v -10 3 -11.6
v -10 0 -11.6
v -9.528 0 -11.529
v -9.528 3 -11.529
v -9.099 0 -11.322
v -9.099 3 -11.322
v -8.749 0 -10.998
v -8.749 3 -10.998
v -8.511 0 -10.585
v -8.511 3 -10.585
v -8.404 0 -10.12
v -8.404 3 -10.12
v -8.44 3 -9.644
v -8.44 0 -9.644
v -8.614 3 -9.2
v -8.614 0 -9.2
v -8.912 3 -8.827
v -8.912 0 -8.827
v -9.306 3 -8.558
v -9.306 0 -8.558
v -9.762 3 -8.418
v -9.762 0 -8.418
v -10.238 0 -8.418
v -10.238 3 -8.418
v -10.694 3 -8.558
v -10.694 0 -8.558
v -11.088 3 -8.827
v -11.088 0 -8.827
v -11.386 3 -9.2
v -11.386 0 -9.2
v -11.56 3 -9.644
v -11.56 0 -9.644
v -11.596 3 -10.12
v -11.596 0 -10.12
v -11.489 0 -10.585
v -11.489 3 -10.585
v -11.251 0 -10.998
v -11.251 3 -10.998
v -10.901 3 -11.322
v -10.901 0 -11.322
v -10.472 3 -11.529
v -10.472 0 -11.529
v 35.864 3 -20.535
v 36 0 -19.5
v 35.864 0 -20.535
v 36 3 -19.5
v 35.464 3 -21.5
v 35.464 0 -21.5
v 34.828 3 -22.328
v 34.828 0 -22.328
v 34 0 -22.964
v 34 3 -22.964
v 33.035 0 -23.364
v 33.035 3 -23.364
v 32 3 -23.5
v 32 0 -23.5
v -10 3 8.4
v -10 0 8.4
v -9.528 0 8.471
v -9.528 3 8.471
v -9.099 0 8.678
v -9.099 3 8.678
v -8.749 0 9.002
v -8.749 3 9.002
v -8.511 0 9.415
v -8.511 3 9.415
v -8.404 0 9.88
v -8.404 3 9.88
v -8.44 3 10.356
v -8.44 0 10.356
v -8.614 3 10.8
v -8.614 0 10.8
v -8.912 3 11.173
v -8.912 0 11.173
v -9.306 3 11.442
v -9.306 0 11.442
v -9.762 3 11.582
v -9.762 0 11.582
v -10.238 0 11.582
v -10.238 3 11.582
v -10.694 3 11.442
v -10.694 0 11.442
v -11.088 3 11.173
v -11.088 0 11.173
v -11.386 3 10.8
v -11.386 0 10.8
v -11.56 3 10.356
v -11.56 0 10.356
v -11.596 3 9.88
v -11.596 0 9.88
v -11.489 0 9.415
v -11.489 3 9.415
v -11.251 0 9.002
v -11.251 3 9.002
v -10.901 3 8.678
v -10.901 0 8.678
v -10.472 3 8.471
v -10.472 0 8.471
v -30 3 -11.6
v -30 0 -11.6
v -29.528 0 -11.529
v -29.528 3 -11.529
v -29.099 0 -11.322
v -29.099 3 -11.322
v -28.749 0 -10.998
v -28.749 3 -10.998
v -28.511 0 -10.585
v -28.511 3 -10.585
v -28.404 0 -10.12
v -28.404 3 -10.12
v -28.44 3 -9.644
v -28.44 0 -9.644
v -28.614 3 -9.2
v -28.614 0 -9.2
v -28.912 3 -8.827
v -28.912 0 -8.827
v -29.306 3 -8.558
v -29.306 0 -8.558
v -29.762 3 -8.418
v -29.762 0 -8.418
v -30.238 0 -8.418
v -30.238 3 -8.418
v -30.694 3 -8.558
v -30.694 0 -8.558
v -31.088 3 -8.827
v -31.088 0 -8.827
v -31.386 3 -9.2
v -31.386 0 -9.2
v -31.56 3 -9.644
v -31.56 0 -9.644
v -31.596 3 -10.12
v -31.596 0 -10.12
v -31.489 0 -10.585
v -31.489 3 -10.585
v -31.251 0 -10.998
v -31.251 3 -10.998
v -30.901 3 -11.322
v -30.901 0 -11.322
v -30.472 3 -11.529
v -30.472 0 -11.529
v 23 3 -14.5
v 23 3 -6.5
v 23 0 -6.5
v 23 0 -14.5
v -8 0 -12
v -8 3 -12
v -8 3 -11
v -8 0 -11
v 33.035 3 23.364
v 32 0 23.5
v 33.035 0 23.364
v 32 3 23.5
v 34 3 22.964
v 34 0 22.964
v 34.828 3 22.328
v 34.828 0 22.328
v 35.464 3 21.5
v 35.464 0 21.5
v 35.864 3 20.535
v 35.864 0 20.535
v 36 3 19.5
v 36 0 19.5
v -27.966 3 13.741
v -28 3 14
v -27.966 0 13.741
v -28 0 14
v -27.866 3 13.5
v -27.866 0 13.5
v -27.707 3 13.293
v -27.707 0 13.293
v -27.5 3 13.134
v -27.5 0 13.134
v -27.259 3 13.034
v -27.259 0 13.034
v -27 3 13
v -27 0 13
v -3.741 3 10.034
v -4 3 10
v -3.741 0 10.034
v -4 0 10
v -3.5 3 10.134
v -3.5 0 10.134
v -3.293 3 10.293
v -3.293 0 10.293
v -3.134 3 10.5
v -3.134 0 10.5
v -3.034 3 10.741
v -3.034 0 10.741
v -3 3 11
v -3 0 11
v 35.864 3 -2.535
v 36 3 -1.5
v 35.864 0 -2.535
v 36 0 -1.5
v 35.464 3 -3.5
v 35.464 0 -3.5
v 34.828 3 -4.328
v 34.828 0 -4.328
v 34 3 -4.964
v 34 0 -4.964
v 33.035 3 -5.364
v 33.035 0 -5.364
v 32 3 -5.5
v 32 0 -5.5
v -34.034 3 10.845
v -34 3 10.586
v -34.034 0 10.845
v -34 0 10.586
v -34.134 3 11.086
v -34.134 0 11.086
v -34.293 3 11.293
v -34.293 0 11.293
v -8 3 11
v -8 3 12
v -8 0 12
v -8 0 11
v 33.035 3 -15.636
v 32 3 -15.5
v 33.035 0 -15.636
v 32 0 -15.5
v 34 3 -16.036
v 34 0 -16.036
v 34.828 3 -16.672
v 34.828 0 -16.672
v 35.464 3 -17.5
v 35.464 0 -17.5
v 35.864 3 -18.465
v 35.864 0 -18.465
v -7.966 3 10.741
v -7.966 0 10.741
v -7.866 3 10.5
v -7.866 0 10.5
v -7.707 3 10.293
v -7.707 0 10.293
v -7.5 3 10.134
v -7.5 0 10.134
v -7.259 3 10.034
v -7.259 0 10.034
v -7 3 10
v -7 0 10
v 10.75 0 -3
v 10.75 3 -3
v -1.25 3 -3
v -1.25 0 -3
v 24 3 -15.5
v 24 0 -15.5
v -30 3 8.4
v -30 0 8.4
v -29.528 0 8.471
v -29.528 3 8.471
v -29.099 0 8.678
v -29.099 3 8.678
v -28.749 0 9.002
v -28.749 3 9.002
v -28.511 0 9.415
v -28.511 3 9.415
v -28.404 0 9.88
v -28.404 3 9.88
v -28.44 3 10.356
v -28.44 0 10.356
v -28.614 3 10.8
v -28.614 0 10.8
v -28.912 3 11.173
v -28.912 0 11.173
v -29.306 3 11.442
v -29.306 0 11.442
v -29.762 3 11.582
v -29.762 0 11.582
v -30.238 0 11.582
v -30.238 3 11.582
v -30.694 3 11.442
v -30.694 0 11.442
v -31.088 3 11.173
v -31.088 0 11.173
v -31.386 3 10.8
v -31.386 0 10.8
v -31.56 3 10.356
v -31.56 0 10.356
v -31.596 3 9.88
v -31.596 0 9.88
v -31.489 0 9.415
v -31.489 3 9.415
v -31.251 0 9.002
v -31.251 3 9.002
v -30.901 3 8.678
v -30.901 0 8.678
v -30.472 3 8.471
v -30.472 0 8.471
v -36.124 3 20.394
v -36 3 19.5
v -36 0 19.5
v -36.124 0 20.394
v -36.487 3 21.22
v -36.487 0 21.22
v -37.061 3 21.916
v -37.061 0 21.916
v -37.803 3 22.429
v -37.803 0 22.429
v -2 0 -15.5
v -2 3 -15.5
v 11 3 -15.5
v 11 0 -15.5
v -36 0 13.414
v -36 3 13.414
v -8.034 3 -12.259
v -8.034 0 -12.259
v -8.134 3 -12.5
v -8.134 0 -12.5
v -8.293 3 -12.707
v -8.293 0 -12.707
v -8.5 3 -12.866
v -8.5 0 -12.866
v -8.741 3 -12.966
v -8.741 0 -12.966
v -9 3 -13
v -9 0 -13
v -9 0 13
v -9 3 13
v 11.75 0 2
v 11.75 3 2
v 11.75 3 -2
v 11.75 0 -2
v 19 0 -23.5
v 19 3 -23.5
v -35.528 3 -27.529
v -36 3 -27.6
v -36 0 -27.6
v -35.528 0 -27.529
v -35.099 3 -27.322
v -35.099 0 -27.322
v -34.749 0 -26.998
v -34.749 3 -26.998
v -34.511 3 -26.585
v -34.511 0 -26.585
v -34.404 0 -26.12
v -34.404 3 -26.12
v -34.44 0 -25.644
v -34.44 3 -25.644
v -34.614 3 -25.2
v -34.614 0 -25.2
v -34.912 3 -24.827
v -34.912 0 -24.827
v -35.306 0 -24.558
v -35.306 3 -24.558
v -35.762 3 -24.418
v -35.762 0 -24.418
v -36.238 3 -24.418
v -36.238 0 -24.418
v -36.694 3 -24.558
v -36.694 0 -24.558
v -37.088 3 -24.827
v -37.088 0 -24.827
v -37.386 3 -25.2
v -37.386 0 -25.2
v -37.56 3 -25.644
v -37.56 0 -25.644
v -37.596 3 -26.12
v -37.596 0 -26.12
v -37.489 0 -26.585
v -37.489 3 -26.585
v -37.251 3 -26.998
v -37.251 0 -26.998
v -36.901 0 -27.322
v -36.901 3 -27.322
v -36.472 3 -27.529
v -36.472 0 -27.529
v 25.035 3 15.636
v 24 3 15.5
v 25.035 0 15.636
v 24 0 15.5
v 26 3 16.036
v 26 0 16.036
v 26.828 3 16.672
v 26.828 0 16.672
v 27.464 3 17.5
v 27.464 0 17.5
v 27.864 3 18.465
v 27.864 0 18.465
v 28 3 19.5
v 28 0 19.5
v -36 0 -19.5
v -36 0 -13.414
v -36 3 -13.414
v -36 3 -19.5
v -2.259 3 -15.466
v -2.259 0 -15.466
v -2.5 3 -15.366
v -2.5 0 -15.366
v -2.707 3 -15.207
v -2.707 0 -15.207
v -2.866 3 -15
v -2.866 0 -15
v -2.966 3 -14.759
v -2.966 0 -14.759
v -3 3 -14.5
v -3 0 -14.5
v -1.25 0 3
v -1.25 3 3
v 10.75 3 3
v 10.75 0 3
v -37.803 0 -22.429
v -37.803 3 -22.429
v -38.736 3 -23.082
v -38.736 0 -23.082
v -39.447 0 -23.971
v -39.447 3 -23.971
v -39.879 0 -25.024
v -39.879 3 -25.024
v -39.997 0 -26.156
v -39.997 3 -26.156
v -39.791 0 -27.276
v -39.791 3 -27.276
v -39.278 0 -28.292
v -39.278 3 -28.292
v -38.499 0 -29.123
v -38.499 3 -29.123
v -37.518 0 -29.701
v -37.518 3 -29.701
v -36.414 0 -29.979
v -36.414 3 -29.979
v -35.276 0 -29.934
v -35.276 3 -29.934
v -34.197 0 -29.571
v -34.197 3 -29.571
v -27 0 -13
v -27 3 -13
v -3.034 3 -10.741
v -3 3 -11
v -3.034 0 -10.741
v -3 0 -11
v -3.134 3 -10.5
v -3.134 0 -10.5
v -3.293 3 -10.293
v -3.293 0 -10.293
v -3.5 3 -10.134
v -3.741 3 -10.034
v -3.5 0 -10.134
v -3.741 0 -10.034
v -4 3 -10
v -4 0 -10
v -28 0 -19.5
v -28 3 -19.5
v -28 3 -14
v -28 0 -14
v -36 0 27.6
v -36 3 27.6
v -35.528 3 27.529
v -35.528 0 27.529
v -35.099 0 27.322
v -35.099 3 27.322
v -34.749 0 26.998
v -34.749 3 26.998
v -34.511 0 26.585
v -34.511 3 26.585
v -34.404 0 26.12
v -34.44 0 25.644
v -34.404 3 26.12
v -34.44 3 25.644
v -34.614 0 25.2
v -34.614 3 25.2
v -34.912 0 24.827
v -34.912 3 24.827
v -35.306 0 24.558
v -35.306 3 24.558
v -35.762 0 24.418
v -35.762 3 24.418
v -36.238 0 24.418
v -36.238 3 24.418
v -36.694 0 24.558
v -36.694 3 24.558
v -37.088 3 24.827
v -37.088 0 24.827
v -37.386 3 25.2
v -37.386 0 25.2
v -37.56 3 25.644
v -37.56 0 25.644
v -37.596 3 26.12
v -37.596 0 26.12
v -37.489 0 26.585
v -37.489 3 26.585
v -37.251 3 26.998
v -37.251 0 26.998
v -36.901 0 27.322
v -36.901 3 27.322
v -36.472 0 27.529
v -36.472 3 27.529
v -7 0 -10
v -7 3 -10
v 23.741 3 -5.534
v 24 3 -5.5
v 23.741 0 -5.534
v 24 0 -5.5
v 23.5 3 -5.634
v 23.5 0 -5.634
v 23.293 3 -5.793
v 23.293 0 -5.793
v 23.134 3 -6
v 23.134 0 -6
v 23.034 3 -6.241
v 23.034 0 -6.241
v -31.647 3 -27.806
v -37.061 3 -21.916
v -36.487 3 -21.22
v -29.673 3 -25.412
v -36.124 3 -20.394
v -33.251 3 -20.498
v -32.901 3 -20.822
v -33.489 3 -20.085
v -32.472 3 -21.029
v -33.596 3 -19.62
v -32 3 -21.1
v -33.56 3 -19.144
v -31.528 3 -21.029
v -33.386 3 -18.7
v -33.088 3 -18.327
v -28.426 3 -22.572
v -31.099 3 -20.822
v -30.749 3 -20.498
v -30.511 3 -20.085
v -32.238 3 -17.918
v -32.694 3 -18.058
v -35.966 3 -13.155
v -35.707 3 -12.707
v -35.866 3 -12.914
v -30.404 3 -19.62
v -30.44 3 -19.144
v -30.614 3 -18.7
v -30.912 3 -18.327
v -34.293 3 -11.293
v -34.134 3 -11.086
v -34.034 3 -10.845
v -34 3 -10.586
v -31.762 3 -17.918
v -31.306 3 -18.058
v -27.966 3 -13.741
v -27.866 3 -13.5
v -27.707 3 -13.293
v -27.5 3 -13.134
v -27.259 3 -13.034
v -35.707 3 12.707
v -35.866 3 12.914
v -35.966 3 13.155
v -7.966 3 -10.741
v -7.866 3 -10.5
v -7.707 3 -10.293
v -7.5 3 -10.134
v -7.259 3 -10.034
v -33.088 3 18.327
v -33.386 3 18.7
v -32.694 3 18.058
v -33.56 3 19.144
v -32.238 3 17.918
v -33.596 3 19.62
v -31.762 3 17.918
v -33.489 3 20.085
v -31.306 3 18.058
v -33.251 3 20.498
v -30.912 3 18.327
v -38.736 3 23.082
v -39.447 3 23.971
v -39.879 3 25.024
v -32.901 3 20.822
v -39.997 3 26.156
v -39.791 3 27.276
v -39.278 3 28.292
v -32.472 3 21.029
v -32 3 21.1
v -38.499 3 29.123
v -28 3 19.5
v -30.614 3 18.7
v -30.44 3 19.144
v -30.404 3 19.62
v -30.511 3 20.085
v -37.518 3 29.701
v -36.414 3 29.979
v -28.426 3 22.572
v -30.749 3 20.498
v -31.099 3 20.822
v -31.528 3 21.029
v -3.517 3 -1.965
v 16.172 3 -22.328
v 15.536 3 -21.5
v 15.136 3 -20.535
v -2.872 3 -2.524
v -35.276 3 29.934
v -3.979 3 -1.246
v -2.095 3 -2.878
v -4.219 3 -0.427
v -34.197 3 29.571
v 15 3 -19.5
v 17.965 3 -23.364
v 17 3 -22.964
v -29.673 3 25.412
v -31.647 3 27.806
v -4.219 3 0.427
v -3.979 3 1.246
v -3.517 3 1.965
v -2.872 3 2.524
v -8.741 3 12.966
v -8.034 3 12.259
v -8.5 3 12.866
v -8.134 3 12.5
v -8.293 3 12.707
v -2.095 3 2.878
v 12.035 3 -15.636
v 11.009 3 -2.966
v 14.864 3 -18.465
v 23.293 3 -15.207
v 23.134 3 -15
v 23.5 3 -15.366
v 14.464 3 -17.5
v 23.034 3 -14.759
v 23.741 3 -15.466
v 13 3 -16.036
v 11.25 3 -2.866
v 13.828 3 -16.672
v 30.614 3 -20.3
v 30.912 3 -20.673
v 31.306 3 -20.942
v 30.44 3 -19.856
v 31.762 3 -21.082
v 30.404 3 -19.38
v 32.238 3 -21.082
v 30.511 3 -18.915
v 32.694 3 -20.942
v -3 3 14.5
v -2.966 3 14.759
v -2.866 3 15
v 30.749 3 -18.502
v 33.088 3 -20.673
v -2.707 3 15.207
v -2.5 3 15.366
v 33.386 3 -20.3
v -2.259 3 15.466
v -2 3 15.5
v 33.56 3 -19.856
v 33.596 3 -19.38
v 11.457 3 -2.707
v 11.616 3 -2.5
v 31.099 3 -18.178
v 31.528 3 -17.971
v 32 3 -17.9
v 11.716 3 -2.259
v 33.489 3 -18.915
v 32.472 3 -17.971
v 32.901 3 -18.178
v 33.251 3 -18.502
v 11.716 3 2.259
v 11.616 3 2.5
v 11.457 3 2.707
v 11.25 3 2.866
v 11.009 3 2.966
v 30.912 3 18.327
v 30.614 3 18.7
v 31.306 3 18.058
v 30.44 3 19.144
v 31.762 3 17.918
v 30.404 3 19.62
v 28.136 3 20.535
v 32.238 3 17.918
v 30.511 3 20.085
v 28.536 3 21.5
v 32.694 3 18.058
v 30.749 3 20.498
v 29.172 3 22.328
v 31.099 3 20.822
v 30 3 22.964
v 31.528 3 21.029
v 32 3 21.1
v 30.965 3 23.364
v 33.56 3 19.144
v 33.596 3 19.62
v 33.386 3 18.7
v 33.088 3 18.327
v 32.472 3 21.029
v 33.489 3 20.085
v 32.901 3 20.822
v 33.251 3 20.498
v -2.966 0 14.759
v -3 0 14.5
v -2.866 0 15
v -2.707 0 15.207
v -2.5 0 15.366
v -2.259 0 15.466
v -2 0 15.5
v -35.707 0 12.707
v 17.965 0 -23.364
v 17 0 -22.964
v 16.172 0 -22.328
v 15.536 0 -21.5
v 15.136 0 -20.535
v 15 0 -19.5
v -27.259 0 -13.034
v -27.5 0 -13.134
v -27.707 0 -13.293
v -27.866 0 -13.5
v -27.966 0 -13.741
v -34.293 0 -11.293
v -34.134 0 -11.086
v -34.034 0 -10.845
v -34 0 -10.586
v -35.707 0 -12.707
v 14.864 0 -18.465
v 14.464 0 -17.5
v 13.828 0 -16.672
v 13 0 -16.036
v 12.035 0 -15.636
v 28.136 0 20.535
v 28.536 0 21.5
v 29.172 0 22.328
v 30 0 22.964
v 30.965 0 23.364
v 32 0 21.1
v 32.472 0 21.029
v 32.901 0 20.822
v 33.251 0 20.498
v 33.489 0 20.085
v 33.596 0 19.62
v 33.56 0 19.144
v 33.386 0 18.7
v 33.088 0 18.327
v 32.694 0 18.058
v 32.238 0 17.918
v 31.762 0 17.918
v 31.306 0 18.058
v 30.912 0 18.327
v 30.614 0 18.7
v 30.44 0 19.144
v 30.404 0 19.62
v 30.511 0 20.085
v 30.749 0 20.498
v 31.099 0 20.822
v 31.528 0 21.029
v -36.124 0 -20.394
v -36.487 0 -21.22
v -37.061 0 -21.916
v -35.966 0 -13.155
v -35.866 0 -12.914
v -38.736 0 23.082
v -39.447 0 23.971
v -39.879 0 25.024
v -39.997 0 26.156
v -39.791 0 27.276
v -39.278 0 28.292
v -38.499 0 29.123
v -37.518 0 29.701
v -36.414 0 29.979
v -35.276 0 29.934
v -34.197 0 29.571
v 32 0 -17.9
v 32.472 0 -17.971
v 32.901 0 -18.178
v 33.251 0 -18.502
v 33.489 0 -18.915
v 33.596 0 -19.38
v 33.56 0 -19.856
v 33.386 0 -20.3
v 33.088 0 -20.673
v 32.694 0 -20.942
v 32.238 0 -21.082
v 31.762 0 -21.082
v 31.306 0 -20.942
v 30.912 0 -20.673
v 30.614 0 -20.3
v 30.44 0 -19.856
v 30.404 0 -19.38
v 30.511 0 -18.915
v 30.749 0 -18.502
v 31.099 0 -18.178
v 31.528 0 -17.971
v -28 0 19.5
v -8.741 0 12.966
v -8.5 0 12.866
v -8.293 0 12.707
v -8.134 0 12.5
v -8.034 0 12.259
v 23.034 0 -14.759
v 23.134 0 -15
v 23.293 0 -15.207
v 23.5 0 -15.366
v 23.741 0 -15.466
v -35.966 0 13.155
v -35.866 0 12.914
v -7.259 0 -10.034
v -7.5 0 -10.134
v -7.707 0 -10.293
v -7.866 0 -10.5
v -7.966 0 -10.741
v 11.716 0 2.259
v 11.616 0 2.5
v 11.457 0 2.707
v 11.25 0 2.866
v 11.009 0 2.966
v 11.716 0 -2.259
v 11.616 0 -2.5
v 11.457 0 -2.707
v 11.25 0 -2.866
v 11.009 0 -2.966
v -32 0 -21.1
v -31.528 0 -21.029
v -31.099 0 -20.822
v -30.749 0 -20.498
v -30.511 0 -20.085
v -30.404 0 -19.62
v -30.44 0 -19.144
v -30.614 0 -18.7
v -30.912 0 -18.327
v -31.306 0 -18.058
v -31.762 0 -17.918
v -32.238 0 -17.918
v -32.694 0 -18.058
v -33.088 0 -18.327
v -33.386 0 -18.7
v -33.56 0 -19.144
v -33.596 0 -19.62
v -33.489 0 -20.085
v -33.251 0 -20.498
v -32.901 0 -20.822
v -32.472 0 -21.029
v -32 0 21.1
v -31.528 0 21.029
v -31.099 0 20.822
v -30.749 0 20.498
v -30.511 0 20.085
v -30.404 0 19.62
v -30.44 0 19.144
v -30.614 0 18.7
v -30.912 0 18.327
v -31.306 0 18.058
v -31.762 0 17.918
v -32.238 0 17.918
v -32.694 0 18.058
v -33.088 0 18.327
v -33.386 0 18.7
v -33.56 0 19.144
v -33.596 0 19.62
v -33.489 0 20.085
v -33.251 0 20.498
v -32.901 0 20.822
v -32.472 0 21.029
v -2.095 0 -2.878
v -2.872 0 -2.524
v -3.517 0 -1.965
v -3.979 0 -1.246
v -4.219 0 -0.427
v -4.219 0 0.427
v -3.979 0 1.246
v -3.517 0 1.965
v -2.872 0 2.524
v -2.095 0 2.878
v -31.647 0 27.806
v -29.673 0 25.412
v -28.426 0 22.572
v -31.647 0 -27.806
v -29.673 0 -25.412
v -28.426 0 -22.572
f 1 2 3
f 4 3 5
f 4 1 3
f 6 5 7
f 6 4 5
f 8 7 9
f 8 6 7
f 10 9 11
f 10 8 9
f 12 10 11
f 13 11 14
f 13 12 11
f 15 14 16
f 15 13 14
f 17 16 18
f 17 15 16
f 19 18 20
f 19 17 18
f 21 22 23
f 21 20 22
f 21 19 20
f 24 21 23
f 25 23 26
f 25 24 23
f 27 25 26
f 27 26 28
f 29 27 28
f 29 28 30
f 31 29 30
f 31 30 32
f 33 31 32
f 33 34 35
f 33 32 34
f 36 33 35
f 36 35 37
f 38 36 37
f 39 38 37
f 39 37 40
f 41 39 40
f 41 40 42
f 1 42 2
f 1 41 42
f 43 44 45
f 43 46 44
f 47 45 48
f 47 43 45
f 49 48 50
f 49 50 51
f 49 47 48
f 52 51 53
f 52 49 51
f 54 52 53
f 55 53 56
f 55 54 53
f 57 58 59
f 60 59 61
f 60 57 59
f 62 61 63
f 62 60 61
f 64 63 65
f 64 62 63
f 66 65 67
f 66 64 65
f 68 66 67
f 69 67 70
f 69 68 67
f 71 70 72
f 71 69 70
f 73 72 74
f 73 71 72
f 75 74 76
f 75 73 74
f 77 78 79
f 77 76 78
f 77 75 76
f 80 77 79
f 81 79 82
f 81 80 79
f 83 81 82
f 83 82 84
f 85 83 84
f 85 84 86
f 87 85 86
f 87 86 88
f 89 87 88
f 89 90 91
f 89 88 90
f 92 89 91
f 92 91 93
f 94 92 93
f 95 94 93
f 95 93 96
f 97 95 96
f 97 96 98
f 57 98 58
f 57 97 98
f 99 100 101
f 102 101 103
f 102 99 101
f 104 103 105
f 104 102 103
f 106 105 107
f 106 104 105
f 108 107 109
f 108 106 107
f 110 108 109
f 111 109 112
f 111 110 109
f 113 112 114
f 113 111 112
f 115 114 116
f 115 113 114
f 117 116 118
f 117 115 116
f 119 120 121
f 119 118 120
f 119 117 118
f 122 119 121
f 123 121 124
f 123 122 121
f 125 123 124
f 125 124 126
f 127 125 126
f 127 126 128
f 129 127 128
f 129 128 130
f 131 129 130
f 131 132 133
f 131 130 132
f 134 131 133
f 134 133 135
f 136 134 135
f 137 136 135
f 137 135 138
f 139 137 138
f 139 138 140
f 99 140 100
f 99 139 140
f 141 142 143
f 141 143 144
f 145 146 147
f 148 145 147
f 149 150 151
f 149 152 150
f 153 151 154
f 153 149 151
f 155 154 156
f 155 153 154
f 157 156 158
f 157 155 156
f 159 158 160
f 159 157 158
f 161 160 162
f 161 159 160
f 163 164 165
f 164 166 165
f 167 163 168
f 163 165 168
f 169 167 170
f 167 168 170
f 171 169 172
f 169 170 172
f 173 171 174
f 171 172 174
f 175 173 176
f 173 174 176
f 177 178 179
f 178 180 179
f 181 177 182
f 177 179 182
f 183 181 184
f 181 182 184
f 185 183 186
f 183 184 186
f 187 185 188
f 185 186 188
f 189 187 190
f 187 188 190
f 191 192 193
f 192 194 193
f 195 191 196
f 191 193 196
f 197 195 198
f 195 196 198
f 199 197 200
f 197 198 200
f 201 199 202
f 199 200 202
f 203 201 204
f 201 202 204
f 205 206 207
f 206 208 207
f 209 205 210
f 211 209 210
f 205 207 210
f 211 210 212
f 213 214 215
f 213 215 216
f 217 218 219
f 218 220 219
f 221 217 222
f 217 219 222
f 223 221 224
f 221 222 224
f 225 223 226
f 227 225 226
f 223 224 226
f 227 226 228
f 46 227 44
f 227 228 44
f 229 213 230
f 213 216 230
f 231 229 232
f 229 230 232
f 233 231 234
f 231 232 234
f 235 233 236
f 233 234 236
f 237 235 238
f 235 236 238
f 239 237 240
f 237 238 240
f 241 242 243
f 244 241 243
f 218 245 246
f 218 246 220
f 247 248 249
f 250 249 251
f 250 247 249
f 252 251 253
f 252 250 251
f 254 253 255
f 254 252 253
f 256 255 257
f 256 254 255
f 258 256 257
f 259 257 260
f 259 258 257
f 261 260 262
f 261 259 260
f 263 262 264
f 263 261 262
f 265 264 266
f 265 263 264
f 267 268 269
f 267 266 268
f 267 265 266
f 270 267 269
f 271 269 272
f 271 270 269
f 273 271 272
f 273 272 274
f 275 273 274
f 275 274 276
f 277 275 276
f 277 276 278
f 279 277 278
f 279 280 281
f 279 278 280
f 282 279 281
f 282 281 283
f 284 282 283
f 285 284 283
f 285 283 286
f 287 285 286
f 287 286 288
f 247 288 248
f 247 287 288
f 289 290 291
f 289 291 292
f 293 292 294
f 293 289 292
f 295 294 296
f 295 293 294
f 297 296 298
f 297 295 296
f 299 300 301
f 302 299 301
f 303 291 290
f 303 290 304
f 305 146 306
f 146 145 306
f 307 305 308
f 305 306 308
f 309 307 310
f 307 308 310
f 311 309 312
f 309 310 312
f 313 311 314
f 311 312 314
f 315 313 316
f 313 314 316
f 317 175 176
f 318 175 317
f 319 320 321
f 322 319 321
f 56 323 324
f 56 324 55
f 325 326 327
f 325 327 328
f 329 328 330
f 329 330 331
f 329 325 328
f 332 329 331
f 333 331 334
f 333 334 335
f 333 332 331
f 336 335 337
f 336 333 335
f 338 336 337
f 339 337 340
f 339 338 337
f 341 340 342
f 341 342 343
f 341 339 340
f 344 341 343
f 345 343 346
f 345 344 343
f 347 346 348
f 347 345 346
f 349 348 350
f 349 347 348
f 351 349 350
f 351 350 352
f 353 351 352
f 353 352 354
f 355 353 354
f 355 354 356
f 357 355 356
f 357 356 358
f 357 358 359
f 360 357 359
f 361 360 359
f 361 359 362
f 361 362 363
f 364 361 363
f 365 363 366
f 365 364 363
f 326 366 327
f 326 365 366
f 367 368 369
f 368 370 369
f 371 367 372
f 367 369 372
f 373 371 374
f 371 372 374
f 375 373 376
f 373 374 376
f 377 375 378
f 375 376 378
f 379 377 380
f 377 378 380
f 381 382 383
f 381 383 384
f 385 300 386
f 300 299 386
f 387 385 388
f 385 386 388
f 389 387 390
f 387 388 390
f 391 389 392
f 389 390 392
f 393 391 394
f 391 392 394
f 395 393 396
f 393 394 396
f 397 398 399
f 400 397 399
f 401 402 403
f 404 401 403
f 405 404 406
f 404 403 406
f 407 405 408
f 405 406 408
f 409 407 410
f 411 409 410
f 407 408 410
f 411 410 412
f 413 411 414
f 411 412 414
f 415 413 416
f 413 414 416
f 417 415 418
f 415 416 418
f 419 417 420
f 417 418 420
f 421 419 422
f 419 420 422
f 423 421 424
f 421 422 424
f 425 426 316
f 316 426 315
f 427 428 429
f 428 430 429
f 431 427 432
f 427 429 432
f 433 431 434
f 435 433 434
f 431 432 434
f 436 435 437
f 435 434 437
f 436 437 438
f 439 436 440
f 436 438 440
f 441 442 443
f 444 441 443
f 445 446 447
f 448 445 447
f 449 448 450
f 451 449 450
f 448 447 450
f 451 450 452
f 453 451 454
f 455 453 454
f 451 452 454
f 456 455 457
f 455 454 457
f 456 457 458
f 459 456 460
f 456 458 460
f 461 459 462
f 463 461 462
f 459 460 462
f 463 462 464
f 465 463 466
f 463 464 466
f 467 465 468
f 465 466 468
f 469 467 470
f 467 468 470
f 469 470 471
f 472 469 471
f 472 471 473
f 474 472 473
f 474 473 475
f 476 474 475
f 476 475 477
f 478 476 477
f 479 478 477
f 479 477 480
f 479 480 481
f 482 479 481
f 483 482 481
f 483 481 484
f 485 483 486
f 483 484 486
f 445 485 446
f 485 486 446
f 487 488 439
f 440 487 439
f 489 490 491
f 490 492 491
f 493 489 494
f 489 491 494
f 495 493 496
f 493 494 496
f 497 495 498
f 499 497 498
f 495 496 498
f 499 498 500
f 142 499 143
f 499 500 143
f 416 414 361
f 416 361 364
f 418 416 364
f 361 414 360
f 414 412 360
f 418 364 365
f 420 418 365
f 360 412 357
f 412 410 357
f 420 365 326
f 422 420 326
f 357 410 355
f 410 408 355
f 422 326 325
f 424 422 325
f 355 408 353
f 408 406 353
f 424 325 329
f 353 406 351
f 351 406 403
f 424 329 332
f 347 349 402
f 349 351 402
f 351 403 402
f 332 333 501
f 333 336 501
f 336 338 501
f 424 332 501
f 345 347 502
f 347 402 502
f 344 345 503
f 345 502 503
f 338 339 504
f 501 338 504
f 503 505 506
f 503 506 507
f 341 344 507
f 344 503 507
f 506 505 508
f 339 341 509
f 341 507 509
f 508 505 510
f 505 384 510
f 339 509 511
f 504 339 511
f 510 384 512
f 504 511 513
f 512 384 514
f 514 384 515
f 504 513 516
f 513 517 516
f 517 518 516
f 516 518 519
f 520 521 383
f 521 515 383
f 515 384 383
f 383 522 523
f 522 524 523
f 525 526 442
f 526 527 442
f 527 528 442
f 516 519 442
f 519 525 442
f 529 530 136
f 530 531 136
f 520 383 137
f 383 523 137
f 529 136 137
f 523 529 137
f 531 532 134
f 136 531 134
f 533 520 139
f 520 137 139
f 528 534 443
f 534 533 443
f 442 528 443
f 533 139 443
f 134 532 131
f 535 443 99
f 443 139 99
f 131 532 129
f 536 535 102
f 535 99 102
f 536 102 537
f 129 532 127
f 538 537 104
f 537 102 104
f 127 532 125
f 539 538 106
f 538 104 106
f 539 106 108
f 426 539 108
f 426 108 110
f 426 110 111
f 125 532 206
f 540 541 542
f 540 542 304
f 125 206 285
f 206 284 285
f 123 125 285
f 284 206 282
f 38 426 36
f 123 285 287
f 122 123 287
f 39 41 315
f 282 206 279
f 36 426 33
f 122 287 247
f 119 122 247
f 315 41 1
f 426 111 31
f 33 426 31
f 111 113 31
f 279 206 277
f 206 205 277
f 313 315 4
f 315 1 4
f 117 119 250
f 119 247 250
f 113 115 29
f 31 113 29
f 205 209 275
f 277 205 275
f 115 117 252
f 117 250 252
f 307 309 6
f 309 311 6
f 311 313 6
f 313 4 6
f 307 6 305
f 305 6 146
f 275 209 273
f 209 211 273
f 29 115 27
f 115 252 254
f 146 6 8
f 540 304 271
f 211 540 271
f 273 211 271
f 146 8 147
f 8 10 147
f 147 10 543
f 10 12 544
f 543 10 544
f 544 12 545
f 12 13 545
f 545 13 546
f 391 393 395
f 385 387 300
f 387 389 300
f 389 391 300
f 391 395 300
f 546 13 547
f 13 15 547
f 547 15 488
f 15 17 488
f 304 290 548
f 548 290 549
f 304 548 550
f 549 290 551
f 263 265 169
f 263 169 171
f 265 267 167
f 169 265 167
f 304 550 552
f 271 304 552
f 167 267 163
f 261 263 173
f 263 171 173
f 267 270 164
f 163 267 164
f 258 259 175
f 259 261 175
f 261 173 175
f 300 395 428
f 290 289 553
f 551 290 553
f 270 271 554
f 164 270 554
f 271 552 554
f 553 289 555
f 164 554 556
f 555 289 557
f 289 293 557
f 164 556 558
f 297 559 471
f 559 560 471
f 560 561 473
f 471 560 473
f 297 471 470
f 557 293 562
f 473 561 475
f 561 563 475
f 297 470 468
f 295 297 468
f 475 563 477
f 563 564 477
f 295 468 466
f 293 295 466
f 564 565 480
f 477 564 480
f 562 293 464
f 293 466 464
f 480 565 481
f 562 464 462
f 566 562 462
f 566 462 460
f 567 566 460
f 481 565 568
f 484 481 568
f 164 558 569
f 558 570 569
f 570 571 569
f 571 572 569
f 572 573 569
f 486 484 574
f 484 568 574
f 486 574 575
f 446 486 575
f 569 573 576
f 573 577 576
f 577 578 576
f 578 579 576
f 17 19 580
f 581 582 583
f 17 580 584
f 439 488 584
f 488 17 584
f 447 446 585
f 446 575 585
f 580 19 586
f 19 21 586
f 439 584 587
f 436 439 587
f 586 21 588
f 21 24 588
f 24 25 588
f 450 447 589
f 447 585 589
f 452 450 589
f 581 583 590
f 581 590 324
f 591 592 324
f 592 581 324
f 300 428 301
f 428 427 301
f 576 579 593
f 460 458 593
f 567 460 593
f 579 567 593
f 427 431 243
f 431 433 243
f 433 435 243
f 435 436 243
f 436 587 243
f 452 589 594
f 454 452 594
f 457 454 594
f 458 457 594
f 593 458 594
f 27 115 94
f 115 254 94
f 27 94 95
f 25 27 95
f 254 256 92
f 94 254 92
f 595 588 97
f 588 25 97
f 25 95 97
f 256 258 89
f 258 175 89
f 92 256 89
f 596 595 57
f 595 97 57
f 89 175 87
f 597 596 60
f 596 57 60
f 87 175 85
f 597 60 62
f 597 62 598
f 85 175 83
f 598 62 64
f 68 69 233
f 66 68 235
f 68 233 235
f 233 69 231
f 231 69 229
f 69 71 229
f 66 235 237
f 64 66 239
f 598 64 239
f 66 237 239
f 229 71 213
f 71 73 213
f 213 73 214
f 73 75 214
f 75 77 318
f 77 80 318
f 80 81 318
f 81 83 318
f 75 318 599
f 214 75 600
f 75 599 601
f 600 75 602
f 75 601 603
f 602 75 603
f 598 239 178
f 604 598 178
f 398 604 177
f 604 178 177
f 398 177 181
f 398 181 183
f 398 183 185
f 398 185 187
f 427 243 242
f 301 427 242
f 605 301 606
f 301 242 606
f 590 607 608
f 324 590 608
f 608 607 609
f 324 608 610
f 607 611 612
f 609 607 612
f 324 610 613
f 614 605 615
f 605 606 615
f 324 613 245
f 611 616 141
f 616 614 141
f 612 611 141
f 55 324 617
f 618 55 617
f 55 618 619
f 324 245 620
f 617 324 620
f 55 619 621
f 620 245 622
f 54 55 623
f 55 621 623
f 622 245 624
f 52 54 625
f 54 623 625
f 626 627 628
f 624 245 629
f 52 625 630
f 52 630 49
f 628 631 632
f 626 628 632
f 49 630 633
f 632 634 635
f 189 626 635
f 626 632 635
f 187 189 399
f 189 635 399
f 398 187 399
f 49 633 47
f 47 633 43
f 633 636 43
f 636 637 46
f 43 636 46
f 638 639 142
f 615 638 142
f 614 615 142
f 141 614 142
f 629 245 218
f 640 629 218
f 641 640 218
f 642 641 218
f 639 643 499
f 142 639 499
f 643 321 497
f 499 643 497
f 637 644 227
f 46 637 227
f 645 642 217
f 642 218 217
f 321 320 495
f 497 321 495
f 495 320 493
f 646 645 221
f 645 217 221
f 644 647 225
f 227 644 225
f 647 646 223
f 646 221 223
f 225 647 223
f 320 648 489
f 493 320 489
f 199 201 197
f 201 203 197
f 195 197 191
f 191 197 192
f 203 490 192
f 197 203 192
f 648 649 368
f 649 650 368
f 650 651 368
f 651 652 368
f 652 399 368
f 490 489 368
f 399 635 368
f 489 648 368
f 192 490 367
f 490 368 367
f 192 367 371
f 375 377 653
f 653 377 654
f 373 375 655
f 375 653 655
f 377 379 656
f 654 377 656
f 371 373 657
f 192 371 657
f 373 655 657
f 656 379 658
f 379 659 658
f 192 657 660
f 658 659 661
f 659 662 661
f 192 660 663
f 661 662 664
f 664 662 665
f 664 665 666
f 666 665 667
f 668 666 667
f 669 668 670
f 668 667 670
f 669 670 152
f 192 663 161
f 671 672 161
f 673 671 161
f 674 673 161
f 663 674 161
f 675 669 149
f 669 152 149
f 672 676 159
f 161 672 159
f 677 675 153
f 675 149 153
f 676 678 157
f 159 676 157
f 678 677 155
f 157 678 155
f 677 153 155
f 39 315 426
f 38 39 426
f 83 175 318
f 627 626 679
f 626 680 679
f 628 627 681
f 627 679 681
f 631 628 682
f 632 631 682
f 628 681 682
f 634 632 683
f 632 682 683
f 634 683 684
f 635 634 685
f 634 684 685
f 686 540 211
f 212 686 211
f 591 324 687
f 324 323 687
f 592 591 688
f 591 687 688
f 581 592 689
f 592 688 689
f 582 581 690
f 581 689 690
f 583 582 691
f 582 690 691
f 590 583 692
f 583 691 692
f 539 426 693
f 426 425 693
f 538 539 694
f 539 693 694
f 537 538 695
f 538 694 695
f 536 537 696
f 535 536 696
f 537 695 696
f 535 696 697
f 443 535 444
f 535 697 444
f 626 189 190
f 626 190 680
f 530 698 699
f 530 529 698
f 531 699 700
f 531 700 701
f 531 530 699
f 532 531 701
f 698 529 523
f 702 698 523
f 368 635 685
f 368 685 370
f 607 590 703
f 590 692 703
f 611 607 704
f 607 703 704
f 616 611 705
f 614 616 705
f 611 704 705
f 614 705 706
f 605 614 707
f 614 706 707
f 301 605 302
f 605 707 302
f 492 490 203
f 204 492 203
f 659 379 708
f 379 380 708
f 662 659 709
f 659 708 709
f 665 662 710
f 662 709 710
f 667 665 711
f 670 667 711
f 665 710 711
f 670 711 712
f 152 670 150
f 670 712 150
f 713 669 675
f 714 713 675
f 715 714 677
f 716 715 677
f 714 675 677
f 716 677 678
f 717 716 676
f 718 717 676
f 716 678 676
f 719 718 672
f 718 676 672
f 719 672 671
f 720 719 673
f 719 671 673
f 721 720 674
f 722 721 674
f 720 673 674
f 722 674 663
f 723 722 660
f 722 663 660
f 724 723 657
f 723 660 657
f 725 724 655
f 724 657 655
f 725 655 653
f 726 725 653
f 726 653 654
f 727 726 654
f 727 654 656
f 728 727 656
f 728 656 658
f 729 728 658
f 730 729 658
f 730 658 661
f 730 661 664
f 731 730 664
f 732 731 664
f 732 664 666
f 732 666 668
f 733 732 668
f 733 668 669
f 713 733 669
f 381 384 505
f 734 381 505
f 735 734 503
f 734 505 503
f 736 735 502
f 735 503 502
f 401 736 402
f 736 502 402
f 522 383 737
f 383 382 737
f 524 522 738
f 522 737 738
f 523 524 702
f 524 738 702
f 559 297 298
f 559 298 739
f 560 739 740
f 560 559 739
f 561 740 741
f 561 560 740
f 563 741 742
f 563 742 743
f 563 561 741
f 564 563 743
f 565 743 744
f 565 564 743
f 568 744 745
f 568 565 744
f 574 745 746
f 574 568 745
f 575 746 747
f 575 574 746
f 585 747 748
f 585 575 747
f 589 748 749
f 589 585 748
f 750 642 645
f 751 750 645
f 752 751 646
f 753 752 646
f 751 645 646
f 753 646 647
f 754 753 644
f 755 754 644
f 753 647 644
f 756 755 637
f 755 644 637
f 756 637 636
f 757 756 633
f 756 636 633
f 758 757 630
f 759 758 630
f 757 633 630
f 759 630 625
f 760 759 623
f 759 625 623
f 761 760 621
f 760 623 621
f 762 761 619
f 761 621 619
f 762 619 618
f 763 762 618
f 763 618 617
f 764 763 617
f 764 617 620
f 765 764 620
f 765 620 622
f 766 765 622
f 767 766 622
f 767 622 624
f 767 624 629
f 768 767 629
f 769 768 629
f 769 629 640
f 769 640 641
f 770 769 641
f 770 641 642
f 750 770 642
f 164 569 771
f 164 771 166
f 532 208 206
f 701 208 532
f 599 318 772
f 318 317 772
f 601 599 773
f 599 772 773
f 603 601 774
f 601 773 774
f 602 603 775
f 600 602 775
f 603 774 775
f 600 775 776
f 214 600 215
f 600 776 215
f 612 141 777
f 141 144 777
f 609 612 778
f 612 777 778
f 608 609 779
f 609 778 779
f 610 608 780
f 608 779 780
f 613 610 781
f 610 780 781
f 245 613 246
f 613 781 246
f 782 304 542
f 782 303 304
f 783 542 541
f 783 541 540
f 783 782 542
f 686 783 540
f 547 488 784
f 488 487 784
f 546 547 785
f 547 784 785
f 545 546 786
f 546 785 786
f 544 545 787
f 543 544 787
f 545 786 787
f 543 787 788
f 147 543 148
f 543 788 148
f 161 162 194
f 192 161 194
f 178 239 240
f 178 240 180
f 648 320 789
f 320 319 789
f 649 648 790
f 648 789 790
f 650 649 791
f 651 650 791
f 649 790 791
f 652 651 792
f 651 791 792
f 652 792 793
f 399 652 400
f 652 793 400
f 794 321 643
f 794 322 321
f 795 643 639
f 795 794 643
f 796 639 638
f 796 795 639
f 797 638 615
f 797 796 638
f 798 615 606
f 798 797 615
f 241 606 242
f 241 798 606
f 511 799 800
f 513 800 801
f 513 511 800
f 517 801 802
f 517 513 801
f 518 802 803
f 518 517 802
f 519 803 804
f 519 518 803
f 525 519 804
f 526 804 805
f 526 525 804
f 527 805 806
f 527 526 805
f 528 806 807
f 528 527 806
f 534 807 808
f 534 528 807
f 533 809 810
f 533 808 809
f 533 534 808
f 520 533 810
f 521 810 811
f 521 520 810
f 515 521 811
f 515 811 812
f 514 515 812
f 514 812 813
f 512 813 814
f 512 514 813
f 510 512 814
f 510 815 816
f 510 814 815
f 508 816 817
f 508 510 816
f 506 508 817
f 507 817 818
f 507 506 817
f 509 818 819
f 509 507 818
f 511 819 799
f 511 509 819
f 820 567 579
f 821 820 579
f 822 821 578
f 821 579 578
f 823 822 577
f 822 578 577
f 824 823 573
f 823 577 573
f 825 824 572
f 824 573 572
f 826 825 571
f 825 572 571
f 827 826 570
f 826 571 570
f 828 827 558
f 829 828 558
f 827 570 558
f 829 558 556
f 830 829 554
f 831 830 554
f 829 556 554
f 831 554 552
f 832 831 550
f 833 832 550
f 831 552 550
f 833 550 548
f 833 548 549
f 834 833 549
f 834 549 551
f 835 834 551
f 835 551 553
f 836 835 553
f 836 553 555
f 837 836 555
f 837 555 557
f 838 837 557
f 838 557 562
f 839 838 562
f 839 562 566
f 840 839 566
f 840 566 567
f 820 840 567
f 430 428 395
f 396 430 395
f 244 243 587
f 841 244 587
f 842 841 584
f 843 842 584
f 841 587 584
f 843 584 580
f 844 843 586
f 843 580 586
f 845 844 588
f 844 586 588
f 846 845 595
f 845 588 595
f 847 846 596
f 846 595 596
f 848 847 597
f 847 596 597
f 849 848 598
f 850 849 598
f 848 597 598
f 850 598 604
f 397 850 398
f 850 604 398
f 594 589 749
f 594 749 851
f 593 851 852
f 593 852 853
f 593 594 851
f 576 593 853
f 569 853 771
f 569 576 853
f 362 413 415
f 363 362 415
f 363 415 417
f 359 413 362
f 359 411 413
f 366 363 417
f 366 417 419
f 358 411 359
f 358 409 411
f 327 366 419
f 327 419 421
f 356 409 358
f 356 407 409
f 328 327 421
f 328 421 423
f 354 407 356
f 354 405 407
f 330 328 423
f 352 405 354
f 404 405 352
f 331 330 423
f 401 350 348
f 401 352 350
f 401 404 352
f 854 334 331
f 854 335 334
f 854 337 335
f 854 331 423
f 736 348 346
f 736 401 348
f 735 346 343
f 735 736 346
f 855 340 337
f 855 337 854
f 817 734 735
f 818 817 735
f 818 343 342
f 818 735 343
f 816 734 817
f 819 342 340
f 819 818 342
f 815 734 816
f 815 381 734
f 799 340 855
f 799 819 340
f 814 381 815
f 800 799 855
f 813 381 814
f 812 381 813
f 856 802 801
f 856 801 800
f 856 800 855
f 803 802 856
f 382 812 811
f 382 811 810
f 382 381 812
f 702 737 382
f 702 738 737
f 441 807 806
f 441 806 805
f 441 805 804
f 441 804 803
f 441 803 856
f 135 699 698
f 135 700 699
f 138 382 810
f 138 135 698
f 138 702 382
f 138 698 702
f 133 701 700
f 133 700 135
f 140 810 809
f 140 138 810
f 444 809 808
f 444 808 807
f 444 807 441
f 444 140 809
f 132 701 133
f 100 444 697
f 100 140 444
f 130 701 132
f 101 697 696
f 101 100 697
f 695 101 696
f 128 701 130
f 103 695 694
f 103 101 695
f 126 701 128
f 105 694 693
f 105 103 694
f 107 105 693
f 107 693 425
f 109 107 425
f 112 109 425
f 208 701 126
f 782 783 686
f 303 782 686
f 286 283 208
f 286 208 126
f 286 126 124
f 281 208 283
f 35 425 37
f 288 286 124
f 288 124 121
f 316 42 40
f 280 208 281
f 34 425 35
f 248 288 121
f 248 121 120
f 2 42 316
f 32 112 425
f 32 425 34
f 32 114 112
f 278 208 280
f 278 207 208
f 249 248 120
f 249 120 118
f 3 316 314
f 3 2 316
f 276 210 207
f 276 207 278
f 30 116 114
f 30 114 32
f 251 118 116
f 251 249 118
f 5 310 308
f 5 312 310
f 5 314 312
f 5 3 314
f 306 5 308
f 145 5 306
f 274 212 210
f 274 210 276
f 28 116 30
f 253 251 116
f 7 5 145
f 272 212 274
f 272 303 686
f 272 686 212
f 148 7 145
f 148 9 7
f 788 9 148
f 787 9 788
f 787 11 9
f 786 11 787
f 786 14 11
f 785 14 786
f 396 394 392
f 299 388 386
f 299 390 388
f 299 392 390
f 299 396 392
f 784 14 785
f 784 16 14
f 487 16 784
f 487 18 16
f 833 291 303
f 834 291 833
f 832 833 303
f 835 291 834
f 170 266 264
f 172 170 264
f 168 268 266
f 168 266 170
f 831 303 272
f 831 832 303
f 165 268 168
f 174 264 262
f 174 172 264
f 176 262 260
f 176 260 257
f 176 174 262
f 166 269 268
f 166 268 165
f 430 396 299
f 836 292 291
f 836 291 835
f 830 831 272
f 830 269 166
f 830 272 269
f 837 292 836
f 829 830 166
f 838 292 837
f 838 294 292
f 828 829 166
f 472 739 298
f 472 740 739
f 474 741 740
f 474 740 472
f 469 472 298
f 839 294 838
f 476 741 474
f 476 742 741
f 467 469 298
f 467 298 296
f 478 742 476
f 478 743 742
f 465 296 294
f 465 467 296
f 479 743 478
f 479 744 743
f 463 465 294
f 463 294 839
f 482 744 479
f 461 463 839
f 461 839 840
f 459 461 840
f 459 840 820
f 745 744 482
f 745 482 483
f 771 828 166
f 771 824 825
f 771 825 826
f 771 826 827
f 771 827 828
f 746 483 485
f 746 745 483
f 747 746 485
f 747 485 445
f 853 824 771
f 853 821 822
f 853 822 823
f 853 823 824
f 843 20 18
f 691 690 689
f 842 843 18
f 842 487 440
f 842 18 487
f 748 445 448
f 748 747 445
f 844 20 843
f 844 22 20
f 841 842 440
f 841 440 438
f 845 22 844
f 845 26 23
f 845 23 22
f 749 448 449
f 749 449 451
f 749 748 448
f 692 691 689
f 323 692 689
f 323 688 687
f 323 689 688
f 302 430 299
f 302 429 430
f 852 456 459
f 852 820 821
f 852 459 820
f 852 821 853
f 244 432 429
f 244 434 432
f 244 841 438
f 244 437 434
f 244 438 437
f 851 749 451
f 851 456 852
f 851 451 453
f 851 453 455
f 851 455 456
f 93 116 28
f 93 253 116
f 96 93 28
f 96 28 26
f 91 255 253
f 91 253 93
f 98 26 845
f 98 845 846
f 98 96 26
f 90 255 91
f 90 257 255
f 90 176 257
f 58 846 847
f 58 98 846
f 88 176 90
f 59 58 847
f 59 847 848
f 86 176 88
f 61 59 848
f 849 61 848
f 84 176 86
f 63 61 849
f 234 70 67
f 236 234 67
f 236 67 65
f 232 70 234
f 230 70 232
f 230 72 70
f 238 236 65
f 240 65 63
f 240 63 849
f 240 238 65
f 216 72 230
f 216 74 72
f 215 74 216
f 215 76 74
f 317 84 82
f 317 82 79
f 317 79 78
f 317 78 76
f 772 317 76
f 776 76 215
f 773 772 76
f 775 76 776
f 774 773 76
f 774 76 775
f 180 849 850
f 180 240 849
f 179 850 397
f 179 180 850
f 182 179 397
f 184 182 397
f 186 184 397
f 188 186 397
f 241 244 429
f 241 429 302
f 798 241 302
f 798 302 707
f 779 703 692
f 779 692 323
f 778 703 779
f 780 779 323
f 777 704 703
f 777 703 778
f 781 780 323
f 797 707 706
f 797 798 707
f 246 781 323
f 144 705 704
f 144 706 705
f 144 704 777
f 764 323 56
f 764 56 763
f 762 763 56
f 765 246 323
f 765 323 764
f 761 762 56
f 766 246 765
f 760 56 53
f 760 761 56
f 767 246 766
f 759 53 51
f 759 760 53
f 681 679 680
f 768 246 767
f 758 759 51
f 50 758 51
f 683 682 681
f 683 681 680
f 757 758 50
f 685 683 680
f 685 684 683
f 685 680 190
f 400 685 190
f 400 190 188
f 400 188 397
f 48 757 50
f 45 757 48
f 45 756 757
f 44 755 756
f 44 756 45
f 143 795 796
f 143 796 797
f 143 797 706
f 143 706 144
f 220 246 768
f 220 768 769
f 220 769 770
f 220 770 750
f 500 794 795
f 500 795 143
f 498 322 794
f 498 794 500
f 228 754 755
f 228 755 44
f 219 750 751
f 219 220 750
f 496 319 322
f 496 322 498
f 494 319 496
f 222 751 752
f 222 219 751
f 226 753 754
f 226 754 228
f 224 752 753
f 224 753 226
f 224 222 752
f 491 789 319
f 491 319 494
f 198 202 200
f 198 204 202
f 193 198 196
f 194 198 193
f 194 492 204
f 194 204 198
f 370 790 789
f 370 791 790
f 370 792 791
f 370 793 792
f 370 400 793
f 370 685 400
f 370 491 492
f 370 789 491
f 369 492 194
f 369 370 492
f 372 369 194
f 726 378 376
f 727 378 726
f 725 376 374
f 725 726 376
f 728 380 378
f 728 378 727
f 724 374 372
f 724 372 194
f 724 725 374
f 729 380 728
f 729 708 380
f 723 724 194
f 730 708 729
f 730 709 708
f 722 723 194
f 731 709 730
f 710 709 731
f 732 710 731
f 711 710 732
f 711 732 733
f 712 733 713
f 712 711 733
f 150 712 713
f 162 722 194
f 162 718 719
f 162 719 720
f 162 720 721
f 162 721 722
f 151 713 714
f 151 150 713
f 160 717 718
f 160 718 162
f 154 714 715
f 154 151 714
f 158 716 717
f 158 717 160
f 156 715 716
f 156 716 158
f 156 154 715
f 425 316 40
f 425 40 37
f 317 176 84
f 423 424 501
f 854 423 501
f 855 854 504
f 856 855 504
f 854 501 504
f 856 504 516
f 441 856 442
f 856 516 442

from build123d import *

# Parameters (mm, degrees)
CROQUIS1_W              = 72
CROQUIS1_H              = 47
SALIENTE_EXTRUIR1_DEPTH = 3
CROQUIS3_W              = 13
CROQUIS3_H              = 10
CROQUIS3_W_2            = 2
CROQUIS3_H_2            = 21
CORTAR_EXTRUIR2_DEPTH   = 44.095823464
CROQUIS2_R              = 1.6
CORTAR_EXTRUIR1_DEPTH   = 44.095823464
CORTAR_EXTRUIR3_DEPTH   = 34.75
CROQUIS5_R              = 1.6
CORTAR_EXTRUIR7_DEPTH   = 10
CHAFL_N1_SIZE           = 2.5
REDONDEO2_R             = 1
CROQUIS6_R              = 1.6
SALIENTE_EXTRUIR2_DEPTH = 3
REDONDEO1_R             = 4


# Some blends are built 0.0001 mm under size
with BuildPart() as part:
    # Croquis1 → Saliente-Extruir1 (new body)
    with BuildSketch(Plane(origin=(0, 0, 0), x_dir=(1, 0, 0), z_dir=(0, 1, 0))):
        Rectangle(CROQUIS1_W, CROQUIS1_H)
    extrude(amount=SALIENTE_EXTRUIR1_DEPTH)

    # Croquis3 → Cortar-Extruir2 (cut, through all)
    with BuildSketch(Plane(origin=(0, 3, 0), x_dir=(1, 0, 0), z_dir=(0, 1, 0))):
        Polygon((-8, 13), (-8, 10), (-3, 10), (-3, 15.5), (15, 15.5), (15, 23.5), (-36, 23.5), (-36, 19.5), (-28, 19.5), (-28, 13), align=None)
        Polygon((-28, -13), (-8, -13), (-8, -10), (-3, -10), (-3, -15.5), (28, -15.5), (28, -23.5), (-36, -23.5), (-36, -19.5), (-28, -19.5), align=None)
        with Locations((29.5, 10.5)):
            Rectangle(CROQUIS3_W, CROQUIS3_H)
        with Locations((-35, 0)):
            Rectangle(CROQUIS3_W_2, CROQUIS3_H_2)
    extrude(amount=-CORTAR_EXTRUIR2_DEPTH, mode=Mode.SUBTRACT)

    # Croquis2 → Cortar-Extruir1 (cut, through all)
    with BuildSketch(Plane(origin=(0, 3, 0), x_dir=(1, 0, 0), z_dir=(0, 1, 0))):
        with Locations((-32, 19.5)):
            Circle(CROQUIS2_R)
        with Locations(Location((32, 19.5, 0), (0, 0, 270))):
            Circle(CROQUIS2_R)
        with Locations(Location((32, -19.5, 0), (0, 0, 270))):
            Circle(CROQUIS2_R)
        with Locations((-32, -19.5)):
            Circle(CROQUIS2_R)
    extrude(amount=-CORTAR_EXTRUIR1_DEPTH, mode=Mode.SUBTRACT)

    # Croquis4 → Cortar-Extruir3 (cut)
    with BuildSketch(Plane(origin=(0, 3, 0), x_dir=(1, 0, 0), z_dir=(0, 1, 0))):
        with BuildLine():
            Line((-1.25, -3), (11.75, -3))
            Line((11.75, -3), (11.75, 3))
            Line((11.75, 3), (-1.25, 3))
            ThreePointArc((-1.25, 3), (-4.25, 0), (-1.25, -3))
        make_face()
    extrude(amount=-CORTAR_EXTRUIR3_DEPTH, mode=Mode.SUBTRACT)

    # Croquis5 → Cortar-Extruir7 (cut)
    with BuildSketch(Plane(origin=(0, 3, -3), x_dir=(1, 0, 0), z_dir=(0, -1, 0))):
        with Locations(Location((-30, 13, 0), (0, 0, 270))):
            Circle(CROQUIS5_R)
        with Locations(Location((-30, -7, 0), (0, 0, 270))):
            Circle(CROQUIS5_R)
        with Locations(Location((-10, 13, 0), (0, 0, 270))):
            Circle(CROQUIS5_R)
        with Locations(Location((-10, -7, 0), (0, 0, 270))):
            Circle(CROQUIS5_R)
    extrude(amount=CORTAR_EXTRUIR7_DEPTH, mode=Mode.SUBTRACT)

    # Chaflán1
    # the kernel refuses this chamfer: 2.5 mm, written as the material it takes off along each edge
    with BuildSketch(Plane(origin=(-36, 9.42920747, 10.5), x_dir=(-0.0274958766105877, 0, 0.9996219169112968), z_dir=(0, -1, 0))) as chafl_n1_piece_1_section:
        Polygon((CHAFL_N1_SIZE * 0.999621916911, -CHAFL_N1_SIZE * 0.0274958766106), (-CHAFL_N1_SIZE * 0.0274958766106, -CHAFL_N1_SIZE * 0.999621916911), (0, 0), align=None)
    chafl_n1_piece_1 = extrude(amount=15.85841494, mode=Mode.PRIVATE)
    chafl_n1_piece_1 = split(chafl_n1_piece_1, bisect_by=Plane(origin=(-34, 1.5, 11.364296031), z_dir=(-1, 0, 0)), keep=Keep.TOP, mode=Mode.PRIVATE)
    add(chafl_n1_piece_1, mode=Mode.SUBTRACT)
    with BuildSketch(Plane(origin=(-36, 9.42920747, -10.5), x_dir=(0.9996219169112968, 0, 0.027495876610586282), z_dir=(0, -1, 0))) as chafl_n1_piece_2_section:
        Polygon((CHAFL_N1_SIZE * 0.999621916911, -CHAFL_N1_SIZE * 0.0274958766106), (-CHAFL_N1_SIZE * 0.0274958766106, -CHAFL_N1_SIZE * 0.999621916911), (0, 0), align=None)
    chafl_n1_piece_2 = extrude(amount=15.85841494, mode=Mode.PRIVATE)
    chafl_n1_piece_2 = split(chafl_n1_piece_2, bisect_by=Plane(origin=(-34, 1.5, -11.364296031), z_dir=(-1, 0, 0)), keep=Keep.TOP, mode=Mode.PRIVATE)
    add(chafl_n1_piece_2, mode=Mode.SUBTRACT)

    # Redondeo2
    redondeo2_edges = [part.edges().sort_by_distance(p)[0] for p in [
        (11.75, 1.5, -3),
        (11.75, 1.5, 3),
        (-36, 1.5, 13),
        (-36, 1.5, -13),
        (-34, 1.5, 11),
        (-34, 1.5, -11),
        (-8, 1.5, -13),
        (-28, 1.5, -13),
        (-3, 1.5, -15.5),
        (-3, 1.5, -10),
        (-8, 1.5, -10),
        (-28, 1.5, 13),
        (-8, 1.5, 13),
        (-8, 1.5, 10),
        (-3, 1.5, 10),
        (-3, 1.5, 15.5),
        (23, 1.5, -5.5),
        (23, 1.5, -15.5),
    ]]
    fillet(redondeo2_edges, radius=REDONDEO2_R)

    # Croquis6 → Saliente-Extruir2 (add, through all)
    with BuildSketch(Plane(origin=(0, 3, 0), x_dir=(1, 0, 0), z_dir=(0, 1, 0))):
        with BuildLine():
            ThreePointArc((-34.197424136, -29.570815068), (-29.673479987, -25.412473854), (-28, -19.500000848))
            ThreePointArc((-28, -19.500000848), (-31.999999152, -15.5), (-36, -19.499999152))
            ThreePointArc((-36, -19.499999152), (-36.48674652, -21.219694449), (-37.802575864, -22.429184932))
            ThreePointArc((-37.802575864, -22.429184932), (-39.570815068, -27.802575864), (-34.197424136, -29.570815068))
        make_face()
        with Locations(Location((-36, -26, 0), (0, 0, 270))):
            Circle(CROQUIS6_R, mode=Mode.SUBTRACT)
        with Locations(Location((-32, -19.5, 0), (0, 0, 270))):
            Circle(CROQUIS6_R, mode=Mode.SUBTRACT)
    saliente_extruir2 = extrude(amount=-SALIENTE_EXTRUIR2_DEPTH)

    # Simetría1: Saliente-Extruir2 across plane
    add(saliente_extruir2.mirror(Plane.XY))

    # Redondeo1
    redondeo1_edges = [part.edges().sort_by_distance(p)[0] for p in [
        (36, 1.5, -23.5),
        (36, 1.5, 23.5),
        (15, 1.5, -23.5),
        (15, 1.5, -15.5),
        (28, 1.5, 15.5),
        (36, 1.5, -5.5),
        (36, 1.5, -15.5),
        (28, 1.5, 23.5),
    ]]
    fillet(redondeo1_edges, radius=REDONDEO1_R - 0.0001)  # a hair under: the kernel refuses the full size


solid = part.part
